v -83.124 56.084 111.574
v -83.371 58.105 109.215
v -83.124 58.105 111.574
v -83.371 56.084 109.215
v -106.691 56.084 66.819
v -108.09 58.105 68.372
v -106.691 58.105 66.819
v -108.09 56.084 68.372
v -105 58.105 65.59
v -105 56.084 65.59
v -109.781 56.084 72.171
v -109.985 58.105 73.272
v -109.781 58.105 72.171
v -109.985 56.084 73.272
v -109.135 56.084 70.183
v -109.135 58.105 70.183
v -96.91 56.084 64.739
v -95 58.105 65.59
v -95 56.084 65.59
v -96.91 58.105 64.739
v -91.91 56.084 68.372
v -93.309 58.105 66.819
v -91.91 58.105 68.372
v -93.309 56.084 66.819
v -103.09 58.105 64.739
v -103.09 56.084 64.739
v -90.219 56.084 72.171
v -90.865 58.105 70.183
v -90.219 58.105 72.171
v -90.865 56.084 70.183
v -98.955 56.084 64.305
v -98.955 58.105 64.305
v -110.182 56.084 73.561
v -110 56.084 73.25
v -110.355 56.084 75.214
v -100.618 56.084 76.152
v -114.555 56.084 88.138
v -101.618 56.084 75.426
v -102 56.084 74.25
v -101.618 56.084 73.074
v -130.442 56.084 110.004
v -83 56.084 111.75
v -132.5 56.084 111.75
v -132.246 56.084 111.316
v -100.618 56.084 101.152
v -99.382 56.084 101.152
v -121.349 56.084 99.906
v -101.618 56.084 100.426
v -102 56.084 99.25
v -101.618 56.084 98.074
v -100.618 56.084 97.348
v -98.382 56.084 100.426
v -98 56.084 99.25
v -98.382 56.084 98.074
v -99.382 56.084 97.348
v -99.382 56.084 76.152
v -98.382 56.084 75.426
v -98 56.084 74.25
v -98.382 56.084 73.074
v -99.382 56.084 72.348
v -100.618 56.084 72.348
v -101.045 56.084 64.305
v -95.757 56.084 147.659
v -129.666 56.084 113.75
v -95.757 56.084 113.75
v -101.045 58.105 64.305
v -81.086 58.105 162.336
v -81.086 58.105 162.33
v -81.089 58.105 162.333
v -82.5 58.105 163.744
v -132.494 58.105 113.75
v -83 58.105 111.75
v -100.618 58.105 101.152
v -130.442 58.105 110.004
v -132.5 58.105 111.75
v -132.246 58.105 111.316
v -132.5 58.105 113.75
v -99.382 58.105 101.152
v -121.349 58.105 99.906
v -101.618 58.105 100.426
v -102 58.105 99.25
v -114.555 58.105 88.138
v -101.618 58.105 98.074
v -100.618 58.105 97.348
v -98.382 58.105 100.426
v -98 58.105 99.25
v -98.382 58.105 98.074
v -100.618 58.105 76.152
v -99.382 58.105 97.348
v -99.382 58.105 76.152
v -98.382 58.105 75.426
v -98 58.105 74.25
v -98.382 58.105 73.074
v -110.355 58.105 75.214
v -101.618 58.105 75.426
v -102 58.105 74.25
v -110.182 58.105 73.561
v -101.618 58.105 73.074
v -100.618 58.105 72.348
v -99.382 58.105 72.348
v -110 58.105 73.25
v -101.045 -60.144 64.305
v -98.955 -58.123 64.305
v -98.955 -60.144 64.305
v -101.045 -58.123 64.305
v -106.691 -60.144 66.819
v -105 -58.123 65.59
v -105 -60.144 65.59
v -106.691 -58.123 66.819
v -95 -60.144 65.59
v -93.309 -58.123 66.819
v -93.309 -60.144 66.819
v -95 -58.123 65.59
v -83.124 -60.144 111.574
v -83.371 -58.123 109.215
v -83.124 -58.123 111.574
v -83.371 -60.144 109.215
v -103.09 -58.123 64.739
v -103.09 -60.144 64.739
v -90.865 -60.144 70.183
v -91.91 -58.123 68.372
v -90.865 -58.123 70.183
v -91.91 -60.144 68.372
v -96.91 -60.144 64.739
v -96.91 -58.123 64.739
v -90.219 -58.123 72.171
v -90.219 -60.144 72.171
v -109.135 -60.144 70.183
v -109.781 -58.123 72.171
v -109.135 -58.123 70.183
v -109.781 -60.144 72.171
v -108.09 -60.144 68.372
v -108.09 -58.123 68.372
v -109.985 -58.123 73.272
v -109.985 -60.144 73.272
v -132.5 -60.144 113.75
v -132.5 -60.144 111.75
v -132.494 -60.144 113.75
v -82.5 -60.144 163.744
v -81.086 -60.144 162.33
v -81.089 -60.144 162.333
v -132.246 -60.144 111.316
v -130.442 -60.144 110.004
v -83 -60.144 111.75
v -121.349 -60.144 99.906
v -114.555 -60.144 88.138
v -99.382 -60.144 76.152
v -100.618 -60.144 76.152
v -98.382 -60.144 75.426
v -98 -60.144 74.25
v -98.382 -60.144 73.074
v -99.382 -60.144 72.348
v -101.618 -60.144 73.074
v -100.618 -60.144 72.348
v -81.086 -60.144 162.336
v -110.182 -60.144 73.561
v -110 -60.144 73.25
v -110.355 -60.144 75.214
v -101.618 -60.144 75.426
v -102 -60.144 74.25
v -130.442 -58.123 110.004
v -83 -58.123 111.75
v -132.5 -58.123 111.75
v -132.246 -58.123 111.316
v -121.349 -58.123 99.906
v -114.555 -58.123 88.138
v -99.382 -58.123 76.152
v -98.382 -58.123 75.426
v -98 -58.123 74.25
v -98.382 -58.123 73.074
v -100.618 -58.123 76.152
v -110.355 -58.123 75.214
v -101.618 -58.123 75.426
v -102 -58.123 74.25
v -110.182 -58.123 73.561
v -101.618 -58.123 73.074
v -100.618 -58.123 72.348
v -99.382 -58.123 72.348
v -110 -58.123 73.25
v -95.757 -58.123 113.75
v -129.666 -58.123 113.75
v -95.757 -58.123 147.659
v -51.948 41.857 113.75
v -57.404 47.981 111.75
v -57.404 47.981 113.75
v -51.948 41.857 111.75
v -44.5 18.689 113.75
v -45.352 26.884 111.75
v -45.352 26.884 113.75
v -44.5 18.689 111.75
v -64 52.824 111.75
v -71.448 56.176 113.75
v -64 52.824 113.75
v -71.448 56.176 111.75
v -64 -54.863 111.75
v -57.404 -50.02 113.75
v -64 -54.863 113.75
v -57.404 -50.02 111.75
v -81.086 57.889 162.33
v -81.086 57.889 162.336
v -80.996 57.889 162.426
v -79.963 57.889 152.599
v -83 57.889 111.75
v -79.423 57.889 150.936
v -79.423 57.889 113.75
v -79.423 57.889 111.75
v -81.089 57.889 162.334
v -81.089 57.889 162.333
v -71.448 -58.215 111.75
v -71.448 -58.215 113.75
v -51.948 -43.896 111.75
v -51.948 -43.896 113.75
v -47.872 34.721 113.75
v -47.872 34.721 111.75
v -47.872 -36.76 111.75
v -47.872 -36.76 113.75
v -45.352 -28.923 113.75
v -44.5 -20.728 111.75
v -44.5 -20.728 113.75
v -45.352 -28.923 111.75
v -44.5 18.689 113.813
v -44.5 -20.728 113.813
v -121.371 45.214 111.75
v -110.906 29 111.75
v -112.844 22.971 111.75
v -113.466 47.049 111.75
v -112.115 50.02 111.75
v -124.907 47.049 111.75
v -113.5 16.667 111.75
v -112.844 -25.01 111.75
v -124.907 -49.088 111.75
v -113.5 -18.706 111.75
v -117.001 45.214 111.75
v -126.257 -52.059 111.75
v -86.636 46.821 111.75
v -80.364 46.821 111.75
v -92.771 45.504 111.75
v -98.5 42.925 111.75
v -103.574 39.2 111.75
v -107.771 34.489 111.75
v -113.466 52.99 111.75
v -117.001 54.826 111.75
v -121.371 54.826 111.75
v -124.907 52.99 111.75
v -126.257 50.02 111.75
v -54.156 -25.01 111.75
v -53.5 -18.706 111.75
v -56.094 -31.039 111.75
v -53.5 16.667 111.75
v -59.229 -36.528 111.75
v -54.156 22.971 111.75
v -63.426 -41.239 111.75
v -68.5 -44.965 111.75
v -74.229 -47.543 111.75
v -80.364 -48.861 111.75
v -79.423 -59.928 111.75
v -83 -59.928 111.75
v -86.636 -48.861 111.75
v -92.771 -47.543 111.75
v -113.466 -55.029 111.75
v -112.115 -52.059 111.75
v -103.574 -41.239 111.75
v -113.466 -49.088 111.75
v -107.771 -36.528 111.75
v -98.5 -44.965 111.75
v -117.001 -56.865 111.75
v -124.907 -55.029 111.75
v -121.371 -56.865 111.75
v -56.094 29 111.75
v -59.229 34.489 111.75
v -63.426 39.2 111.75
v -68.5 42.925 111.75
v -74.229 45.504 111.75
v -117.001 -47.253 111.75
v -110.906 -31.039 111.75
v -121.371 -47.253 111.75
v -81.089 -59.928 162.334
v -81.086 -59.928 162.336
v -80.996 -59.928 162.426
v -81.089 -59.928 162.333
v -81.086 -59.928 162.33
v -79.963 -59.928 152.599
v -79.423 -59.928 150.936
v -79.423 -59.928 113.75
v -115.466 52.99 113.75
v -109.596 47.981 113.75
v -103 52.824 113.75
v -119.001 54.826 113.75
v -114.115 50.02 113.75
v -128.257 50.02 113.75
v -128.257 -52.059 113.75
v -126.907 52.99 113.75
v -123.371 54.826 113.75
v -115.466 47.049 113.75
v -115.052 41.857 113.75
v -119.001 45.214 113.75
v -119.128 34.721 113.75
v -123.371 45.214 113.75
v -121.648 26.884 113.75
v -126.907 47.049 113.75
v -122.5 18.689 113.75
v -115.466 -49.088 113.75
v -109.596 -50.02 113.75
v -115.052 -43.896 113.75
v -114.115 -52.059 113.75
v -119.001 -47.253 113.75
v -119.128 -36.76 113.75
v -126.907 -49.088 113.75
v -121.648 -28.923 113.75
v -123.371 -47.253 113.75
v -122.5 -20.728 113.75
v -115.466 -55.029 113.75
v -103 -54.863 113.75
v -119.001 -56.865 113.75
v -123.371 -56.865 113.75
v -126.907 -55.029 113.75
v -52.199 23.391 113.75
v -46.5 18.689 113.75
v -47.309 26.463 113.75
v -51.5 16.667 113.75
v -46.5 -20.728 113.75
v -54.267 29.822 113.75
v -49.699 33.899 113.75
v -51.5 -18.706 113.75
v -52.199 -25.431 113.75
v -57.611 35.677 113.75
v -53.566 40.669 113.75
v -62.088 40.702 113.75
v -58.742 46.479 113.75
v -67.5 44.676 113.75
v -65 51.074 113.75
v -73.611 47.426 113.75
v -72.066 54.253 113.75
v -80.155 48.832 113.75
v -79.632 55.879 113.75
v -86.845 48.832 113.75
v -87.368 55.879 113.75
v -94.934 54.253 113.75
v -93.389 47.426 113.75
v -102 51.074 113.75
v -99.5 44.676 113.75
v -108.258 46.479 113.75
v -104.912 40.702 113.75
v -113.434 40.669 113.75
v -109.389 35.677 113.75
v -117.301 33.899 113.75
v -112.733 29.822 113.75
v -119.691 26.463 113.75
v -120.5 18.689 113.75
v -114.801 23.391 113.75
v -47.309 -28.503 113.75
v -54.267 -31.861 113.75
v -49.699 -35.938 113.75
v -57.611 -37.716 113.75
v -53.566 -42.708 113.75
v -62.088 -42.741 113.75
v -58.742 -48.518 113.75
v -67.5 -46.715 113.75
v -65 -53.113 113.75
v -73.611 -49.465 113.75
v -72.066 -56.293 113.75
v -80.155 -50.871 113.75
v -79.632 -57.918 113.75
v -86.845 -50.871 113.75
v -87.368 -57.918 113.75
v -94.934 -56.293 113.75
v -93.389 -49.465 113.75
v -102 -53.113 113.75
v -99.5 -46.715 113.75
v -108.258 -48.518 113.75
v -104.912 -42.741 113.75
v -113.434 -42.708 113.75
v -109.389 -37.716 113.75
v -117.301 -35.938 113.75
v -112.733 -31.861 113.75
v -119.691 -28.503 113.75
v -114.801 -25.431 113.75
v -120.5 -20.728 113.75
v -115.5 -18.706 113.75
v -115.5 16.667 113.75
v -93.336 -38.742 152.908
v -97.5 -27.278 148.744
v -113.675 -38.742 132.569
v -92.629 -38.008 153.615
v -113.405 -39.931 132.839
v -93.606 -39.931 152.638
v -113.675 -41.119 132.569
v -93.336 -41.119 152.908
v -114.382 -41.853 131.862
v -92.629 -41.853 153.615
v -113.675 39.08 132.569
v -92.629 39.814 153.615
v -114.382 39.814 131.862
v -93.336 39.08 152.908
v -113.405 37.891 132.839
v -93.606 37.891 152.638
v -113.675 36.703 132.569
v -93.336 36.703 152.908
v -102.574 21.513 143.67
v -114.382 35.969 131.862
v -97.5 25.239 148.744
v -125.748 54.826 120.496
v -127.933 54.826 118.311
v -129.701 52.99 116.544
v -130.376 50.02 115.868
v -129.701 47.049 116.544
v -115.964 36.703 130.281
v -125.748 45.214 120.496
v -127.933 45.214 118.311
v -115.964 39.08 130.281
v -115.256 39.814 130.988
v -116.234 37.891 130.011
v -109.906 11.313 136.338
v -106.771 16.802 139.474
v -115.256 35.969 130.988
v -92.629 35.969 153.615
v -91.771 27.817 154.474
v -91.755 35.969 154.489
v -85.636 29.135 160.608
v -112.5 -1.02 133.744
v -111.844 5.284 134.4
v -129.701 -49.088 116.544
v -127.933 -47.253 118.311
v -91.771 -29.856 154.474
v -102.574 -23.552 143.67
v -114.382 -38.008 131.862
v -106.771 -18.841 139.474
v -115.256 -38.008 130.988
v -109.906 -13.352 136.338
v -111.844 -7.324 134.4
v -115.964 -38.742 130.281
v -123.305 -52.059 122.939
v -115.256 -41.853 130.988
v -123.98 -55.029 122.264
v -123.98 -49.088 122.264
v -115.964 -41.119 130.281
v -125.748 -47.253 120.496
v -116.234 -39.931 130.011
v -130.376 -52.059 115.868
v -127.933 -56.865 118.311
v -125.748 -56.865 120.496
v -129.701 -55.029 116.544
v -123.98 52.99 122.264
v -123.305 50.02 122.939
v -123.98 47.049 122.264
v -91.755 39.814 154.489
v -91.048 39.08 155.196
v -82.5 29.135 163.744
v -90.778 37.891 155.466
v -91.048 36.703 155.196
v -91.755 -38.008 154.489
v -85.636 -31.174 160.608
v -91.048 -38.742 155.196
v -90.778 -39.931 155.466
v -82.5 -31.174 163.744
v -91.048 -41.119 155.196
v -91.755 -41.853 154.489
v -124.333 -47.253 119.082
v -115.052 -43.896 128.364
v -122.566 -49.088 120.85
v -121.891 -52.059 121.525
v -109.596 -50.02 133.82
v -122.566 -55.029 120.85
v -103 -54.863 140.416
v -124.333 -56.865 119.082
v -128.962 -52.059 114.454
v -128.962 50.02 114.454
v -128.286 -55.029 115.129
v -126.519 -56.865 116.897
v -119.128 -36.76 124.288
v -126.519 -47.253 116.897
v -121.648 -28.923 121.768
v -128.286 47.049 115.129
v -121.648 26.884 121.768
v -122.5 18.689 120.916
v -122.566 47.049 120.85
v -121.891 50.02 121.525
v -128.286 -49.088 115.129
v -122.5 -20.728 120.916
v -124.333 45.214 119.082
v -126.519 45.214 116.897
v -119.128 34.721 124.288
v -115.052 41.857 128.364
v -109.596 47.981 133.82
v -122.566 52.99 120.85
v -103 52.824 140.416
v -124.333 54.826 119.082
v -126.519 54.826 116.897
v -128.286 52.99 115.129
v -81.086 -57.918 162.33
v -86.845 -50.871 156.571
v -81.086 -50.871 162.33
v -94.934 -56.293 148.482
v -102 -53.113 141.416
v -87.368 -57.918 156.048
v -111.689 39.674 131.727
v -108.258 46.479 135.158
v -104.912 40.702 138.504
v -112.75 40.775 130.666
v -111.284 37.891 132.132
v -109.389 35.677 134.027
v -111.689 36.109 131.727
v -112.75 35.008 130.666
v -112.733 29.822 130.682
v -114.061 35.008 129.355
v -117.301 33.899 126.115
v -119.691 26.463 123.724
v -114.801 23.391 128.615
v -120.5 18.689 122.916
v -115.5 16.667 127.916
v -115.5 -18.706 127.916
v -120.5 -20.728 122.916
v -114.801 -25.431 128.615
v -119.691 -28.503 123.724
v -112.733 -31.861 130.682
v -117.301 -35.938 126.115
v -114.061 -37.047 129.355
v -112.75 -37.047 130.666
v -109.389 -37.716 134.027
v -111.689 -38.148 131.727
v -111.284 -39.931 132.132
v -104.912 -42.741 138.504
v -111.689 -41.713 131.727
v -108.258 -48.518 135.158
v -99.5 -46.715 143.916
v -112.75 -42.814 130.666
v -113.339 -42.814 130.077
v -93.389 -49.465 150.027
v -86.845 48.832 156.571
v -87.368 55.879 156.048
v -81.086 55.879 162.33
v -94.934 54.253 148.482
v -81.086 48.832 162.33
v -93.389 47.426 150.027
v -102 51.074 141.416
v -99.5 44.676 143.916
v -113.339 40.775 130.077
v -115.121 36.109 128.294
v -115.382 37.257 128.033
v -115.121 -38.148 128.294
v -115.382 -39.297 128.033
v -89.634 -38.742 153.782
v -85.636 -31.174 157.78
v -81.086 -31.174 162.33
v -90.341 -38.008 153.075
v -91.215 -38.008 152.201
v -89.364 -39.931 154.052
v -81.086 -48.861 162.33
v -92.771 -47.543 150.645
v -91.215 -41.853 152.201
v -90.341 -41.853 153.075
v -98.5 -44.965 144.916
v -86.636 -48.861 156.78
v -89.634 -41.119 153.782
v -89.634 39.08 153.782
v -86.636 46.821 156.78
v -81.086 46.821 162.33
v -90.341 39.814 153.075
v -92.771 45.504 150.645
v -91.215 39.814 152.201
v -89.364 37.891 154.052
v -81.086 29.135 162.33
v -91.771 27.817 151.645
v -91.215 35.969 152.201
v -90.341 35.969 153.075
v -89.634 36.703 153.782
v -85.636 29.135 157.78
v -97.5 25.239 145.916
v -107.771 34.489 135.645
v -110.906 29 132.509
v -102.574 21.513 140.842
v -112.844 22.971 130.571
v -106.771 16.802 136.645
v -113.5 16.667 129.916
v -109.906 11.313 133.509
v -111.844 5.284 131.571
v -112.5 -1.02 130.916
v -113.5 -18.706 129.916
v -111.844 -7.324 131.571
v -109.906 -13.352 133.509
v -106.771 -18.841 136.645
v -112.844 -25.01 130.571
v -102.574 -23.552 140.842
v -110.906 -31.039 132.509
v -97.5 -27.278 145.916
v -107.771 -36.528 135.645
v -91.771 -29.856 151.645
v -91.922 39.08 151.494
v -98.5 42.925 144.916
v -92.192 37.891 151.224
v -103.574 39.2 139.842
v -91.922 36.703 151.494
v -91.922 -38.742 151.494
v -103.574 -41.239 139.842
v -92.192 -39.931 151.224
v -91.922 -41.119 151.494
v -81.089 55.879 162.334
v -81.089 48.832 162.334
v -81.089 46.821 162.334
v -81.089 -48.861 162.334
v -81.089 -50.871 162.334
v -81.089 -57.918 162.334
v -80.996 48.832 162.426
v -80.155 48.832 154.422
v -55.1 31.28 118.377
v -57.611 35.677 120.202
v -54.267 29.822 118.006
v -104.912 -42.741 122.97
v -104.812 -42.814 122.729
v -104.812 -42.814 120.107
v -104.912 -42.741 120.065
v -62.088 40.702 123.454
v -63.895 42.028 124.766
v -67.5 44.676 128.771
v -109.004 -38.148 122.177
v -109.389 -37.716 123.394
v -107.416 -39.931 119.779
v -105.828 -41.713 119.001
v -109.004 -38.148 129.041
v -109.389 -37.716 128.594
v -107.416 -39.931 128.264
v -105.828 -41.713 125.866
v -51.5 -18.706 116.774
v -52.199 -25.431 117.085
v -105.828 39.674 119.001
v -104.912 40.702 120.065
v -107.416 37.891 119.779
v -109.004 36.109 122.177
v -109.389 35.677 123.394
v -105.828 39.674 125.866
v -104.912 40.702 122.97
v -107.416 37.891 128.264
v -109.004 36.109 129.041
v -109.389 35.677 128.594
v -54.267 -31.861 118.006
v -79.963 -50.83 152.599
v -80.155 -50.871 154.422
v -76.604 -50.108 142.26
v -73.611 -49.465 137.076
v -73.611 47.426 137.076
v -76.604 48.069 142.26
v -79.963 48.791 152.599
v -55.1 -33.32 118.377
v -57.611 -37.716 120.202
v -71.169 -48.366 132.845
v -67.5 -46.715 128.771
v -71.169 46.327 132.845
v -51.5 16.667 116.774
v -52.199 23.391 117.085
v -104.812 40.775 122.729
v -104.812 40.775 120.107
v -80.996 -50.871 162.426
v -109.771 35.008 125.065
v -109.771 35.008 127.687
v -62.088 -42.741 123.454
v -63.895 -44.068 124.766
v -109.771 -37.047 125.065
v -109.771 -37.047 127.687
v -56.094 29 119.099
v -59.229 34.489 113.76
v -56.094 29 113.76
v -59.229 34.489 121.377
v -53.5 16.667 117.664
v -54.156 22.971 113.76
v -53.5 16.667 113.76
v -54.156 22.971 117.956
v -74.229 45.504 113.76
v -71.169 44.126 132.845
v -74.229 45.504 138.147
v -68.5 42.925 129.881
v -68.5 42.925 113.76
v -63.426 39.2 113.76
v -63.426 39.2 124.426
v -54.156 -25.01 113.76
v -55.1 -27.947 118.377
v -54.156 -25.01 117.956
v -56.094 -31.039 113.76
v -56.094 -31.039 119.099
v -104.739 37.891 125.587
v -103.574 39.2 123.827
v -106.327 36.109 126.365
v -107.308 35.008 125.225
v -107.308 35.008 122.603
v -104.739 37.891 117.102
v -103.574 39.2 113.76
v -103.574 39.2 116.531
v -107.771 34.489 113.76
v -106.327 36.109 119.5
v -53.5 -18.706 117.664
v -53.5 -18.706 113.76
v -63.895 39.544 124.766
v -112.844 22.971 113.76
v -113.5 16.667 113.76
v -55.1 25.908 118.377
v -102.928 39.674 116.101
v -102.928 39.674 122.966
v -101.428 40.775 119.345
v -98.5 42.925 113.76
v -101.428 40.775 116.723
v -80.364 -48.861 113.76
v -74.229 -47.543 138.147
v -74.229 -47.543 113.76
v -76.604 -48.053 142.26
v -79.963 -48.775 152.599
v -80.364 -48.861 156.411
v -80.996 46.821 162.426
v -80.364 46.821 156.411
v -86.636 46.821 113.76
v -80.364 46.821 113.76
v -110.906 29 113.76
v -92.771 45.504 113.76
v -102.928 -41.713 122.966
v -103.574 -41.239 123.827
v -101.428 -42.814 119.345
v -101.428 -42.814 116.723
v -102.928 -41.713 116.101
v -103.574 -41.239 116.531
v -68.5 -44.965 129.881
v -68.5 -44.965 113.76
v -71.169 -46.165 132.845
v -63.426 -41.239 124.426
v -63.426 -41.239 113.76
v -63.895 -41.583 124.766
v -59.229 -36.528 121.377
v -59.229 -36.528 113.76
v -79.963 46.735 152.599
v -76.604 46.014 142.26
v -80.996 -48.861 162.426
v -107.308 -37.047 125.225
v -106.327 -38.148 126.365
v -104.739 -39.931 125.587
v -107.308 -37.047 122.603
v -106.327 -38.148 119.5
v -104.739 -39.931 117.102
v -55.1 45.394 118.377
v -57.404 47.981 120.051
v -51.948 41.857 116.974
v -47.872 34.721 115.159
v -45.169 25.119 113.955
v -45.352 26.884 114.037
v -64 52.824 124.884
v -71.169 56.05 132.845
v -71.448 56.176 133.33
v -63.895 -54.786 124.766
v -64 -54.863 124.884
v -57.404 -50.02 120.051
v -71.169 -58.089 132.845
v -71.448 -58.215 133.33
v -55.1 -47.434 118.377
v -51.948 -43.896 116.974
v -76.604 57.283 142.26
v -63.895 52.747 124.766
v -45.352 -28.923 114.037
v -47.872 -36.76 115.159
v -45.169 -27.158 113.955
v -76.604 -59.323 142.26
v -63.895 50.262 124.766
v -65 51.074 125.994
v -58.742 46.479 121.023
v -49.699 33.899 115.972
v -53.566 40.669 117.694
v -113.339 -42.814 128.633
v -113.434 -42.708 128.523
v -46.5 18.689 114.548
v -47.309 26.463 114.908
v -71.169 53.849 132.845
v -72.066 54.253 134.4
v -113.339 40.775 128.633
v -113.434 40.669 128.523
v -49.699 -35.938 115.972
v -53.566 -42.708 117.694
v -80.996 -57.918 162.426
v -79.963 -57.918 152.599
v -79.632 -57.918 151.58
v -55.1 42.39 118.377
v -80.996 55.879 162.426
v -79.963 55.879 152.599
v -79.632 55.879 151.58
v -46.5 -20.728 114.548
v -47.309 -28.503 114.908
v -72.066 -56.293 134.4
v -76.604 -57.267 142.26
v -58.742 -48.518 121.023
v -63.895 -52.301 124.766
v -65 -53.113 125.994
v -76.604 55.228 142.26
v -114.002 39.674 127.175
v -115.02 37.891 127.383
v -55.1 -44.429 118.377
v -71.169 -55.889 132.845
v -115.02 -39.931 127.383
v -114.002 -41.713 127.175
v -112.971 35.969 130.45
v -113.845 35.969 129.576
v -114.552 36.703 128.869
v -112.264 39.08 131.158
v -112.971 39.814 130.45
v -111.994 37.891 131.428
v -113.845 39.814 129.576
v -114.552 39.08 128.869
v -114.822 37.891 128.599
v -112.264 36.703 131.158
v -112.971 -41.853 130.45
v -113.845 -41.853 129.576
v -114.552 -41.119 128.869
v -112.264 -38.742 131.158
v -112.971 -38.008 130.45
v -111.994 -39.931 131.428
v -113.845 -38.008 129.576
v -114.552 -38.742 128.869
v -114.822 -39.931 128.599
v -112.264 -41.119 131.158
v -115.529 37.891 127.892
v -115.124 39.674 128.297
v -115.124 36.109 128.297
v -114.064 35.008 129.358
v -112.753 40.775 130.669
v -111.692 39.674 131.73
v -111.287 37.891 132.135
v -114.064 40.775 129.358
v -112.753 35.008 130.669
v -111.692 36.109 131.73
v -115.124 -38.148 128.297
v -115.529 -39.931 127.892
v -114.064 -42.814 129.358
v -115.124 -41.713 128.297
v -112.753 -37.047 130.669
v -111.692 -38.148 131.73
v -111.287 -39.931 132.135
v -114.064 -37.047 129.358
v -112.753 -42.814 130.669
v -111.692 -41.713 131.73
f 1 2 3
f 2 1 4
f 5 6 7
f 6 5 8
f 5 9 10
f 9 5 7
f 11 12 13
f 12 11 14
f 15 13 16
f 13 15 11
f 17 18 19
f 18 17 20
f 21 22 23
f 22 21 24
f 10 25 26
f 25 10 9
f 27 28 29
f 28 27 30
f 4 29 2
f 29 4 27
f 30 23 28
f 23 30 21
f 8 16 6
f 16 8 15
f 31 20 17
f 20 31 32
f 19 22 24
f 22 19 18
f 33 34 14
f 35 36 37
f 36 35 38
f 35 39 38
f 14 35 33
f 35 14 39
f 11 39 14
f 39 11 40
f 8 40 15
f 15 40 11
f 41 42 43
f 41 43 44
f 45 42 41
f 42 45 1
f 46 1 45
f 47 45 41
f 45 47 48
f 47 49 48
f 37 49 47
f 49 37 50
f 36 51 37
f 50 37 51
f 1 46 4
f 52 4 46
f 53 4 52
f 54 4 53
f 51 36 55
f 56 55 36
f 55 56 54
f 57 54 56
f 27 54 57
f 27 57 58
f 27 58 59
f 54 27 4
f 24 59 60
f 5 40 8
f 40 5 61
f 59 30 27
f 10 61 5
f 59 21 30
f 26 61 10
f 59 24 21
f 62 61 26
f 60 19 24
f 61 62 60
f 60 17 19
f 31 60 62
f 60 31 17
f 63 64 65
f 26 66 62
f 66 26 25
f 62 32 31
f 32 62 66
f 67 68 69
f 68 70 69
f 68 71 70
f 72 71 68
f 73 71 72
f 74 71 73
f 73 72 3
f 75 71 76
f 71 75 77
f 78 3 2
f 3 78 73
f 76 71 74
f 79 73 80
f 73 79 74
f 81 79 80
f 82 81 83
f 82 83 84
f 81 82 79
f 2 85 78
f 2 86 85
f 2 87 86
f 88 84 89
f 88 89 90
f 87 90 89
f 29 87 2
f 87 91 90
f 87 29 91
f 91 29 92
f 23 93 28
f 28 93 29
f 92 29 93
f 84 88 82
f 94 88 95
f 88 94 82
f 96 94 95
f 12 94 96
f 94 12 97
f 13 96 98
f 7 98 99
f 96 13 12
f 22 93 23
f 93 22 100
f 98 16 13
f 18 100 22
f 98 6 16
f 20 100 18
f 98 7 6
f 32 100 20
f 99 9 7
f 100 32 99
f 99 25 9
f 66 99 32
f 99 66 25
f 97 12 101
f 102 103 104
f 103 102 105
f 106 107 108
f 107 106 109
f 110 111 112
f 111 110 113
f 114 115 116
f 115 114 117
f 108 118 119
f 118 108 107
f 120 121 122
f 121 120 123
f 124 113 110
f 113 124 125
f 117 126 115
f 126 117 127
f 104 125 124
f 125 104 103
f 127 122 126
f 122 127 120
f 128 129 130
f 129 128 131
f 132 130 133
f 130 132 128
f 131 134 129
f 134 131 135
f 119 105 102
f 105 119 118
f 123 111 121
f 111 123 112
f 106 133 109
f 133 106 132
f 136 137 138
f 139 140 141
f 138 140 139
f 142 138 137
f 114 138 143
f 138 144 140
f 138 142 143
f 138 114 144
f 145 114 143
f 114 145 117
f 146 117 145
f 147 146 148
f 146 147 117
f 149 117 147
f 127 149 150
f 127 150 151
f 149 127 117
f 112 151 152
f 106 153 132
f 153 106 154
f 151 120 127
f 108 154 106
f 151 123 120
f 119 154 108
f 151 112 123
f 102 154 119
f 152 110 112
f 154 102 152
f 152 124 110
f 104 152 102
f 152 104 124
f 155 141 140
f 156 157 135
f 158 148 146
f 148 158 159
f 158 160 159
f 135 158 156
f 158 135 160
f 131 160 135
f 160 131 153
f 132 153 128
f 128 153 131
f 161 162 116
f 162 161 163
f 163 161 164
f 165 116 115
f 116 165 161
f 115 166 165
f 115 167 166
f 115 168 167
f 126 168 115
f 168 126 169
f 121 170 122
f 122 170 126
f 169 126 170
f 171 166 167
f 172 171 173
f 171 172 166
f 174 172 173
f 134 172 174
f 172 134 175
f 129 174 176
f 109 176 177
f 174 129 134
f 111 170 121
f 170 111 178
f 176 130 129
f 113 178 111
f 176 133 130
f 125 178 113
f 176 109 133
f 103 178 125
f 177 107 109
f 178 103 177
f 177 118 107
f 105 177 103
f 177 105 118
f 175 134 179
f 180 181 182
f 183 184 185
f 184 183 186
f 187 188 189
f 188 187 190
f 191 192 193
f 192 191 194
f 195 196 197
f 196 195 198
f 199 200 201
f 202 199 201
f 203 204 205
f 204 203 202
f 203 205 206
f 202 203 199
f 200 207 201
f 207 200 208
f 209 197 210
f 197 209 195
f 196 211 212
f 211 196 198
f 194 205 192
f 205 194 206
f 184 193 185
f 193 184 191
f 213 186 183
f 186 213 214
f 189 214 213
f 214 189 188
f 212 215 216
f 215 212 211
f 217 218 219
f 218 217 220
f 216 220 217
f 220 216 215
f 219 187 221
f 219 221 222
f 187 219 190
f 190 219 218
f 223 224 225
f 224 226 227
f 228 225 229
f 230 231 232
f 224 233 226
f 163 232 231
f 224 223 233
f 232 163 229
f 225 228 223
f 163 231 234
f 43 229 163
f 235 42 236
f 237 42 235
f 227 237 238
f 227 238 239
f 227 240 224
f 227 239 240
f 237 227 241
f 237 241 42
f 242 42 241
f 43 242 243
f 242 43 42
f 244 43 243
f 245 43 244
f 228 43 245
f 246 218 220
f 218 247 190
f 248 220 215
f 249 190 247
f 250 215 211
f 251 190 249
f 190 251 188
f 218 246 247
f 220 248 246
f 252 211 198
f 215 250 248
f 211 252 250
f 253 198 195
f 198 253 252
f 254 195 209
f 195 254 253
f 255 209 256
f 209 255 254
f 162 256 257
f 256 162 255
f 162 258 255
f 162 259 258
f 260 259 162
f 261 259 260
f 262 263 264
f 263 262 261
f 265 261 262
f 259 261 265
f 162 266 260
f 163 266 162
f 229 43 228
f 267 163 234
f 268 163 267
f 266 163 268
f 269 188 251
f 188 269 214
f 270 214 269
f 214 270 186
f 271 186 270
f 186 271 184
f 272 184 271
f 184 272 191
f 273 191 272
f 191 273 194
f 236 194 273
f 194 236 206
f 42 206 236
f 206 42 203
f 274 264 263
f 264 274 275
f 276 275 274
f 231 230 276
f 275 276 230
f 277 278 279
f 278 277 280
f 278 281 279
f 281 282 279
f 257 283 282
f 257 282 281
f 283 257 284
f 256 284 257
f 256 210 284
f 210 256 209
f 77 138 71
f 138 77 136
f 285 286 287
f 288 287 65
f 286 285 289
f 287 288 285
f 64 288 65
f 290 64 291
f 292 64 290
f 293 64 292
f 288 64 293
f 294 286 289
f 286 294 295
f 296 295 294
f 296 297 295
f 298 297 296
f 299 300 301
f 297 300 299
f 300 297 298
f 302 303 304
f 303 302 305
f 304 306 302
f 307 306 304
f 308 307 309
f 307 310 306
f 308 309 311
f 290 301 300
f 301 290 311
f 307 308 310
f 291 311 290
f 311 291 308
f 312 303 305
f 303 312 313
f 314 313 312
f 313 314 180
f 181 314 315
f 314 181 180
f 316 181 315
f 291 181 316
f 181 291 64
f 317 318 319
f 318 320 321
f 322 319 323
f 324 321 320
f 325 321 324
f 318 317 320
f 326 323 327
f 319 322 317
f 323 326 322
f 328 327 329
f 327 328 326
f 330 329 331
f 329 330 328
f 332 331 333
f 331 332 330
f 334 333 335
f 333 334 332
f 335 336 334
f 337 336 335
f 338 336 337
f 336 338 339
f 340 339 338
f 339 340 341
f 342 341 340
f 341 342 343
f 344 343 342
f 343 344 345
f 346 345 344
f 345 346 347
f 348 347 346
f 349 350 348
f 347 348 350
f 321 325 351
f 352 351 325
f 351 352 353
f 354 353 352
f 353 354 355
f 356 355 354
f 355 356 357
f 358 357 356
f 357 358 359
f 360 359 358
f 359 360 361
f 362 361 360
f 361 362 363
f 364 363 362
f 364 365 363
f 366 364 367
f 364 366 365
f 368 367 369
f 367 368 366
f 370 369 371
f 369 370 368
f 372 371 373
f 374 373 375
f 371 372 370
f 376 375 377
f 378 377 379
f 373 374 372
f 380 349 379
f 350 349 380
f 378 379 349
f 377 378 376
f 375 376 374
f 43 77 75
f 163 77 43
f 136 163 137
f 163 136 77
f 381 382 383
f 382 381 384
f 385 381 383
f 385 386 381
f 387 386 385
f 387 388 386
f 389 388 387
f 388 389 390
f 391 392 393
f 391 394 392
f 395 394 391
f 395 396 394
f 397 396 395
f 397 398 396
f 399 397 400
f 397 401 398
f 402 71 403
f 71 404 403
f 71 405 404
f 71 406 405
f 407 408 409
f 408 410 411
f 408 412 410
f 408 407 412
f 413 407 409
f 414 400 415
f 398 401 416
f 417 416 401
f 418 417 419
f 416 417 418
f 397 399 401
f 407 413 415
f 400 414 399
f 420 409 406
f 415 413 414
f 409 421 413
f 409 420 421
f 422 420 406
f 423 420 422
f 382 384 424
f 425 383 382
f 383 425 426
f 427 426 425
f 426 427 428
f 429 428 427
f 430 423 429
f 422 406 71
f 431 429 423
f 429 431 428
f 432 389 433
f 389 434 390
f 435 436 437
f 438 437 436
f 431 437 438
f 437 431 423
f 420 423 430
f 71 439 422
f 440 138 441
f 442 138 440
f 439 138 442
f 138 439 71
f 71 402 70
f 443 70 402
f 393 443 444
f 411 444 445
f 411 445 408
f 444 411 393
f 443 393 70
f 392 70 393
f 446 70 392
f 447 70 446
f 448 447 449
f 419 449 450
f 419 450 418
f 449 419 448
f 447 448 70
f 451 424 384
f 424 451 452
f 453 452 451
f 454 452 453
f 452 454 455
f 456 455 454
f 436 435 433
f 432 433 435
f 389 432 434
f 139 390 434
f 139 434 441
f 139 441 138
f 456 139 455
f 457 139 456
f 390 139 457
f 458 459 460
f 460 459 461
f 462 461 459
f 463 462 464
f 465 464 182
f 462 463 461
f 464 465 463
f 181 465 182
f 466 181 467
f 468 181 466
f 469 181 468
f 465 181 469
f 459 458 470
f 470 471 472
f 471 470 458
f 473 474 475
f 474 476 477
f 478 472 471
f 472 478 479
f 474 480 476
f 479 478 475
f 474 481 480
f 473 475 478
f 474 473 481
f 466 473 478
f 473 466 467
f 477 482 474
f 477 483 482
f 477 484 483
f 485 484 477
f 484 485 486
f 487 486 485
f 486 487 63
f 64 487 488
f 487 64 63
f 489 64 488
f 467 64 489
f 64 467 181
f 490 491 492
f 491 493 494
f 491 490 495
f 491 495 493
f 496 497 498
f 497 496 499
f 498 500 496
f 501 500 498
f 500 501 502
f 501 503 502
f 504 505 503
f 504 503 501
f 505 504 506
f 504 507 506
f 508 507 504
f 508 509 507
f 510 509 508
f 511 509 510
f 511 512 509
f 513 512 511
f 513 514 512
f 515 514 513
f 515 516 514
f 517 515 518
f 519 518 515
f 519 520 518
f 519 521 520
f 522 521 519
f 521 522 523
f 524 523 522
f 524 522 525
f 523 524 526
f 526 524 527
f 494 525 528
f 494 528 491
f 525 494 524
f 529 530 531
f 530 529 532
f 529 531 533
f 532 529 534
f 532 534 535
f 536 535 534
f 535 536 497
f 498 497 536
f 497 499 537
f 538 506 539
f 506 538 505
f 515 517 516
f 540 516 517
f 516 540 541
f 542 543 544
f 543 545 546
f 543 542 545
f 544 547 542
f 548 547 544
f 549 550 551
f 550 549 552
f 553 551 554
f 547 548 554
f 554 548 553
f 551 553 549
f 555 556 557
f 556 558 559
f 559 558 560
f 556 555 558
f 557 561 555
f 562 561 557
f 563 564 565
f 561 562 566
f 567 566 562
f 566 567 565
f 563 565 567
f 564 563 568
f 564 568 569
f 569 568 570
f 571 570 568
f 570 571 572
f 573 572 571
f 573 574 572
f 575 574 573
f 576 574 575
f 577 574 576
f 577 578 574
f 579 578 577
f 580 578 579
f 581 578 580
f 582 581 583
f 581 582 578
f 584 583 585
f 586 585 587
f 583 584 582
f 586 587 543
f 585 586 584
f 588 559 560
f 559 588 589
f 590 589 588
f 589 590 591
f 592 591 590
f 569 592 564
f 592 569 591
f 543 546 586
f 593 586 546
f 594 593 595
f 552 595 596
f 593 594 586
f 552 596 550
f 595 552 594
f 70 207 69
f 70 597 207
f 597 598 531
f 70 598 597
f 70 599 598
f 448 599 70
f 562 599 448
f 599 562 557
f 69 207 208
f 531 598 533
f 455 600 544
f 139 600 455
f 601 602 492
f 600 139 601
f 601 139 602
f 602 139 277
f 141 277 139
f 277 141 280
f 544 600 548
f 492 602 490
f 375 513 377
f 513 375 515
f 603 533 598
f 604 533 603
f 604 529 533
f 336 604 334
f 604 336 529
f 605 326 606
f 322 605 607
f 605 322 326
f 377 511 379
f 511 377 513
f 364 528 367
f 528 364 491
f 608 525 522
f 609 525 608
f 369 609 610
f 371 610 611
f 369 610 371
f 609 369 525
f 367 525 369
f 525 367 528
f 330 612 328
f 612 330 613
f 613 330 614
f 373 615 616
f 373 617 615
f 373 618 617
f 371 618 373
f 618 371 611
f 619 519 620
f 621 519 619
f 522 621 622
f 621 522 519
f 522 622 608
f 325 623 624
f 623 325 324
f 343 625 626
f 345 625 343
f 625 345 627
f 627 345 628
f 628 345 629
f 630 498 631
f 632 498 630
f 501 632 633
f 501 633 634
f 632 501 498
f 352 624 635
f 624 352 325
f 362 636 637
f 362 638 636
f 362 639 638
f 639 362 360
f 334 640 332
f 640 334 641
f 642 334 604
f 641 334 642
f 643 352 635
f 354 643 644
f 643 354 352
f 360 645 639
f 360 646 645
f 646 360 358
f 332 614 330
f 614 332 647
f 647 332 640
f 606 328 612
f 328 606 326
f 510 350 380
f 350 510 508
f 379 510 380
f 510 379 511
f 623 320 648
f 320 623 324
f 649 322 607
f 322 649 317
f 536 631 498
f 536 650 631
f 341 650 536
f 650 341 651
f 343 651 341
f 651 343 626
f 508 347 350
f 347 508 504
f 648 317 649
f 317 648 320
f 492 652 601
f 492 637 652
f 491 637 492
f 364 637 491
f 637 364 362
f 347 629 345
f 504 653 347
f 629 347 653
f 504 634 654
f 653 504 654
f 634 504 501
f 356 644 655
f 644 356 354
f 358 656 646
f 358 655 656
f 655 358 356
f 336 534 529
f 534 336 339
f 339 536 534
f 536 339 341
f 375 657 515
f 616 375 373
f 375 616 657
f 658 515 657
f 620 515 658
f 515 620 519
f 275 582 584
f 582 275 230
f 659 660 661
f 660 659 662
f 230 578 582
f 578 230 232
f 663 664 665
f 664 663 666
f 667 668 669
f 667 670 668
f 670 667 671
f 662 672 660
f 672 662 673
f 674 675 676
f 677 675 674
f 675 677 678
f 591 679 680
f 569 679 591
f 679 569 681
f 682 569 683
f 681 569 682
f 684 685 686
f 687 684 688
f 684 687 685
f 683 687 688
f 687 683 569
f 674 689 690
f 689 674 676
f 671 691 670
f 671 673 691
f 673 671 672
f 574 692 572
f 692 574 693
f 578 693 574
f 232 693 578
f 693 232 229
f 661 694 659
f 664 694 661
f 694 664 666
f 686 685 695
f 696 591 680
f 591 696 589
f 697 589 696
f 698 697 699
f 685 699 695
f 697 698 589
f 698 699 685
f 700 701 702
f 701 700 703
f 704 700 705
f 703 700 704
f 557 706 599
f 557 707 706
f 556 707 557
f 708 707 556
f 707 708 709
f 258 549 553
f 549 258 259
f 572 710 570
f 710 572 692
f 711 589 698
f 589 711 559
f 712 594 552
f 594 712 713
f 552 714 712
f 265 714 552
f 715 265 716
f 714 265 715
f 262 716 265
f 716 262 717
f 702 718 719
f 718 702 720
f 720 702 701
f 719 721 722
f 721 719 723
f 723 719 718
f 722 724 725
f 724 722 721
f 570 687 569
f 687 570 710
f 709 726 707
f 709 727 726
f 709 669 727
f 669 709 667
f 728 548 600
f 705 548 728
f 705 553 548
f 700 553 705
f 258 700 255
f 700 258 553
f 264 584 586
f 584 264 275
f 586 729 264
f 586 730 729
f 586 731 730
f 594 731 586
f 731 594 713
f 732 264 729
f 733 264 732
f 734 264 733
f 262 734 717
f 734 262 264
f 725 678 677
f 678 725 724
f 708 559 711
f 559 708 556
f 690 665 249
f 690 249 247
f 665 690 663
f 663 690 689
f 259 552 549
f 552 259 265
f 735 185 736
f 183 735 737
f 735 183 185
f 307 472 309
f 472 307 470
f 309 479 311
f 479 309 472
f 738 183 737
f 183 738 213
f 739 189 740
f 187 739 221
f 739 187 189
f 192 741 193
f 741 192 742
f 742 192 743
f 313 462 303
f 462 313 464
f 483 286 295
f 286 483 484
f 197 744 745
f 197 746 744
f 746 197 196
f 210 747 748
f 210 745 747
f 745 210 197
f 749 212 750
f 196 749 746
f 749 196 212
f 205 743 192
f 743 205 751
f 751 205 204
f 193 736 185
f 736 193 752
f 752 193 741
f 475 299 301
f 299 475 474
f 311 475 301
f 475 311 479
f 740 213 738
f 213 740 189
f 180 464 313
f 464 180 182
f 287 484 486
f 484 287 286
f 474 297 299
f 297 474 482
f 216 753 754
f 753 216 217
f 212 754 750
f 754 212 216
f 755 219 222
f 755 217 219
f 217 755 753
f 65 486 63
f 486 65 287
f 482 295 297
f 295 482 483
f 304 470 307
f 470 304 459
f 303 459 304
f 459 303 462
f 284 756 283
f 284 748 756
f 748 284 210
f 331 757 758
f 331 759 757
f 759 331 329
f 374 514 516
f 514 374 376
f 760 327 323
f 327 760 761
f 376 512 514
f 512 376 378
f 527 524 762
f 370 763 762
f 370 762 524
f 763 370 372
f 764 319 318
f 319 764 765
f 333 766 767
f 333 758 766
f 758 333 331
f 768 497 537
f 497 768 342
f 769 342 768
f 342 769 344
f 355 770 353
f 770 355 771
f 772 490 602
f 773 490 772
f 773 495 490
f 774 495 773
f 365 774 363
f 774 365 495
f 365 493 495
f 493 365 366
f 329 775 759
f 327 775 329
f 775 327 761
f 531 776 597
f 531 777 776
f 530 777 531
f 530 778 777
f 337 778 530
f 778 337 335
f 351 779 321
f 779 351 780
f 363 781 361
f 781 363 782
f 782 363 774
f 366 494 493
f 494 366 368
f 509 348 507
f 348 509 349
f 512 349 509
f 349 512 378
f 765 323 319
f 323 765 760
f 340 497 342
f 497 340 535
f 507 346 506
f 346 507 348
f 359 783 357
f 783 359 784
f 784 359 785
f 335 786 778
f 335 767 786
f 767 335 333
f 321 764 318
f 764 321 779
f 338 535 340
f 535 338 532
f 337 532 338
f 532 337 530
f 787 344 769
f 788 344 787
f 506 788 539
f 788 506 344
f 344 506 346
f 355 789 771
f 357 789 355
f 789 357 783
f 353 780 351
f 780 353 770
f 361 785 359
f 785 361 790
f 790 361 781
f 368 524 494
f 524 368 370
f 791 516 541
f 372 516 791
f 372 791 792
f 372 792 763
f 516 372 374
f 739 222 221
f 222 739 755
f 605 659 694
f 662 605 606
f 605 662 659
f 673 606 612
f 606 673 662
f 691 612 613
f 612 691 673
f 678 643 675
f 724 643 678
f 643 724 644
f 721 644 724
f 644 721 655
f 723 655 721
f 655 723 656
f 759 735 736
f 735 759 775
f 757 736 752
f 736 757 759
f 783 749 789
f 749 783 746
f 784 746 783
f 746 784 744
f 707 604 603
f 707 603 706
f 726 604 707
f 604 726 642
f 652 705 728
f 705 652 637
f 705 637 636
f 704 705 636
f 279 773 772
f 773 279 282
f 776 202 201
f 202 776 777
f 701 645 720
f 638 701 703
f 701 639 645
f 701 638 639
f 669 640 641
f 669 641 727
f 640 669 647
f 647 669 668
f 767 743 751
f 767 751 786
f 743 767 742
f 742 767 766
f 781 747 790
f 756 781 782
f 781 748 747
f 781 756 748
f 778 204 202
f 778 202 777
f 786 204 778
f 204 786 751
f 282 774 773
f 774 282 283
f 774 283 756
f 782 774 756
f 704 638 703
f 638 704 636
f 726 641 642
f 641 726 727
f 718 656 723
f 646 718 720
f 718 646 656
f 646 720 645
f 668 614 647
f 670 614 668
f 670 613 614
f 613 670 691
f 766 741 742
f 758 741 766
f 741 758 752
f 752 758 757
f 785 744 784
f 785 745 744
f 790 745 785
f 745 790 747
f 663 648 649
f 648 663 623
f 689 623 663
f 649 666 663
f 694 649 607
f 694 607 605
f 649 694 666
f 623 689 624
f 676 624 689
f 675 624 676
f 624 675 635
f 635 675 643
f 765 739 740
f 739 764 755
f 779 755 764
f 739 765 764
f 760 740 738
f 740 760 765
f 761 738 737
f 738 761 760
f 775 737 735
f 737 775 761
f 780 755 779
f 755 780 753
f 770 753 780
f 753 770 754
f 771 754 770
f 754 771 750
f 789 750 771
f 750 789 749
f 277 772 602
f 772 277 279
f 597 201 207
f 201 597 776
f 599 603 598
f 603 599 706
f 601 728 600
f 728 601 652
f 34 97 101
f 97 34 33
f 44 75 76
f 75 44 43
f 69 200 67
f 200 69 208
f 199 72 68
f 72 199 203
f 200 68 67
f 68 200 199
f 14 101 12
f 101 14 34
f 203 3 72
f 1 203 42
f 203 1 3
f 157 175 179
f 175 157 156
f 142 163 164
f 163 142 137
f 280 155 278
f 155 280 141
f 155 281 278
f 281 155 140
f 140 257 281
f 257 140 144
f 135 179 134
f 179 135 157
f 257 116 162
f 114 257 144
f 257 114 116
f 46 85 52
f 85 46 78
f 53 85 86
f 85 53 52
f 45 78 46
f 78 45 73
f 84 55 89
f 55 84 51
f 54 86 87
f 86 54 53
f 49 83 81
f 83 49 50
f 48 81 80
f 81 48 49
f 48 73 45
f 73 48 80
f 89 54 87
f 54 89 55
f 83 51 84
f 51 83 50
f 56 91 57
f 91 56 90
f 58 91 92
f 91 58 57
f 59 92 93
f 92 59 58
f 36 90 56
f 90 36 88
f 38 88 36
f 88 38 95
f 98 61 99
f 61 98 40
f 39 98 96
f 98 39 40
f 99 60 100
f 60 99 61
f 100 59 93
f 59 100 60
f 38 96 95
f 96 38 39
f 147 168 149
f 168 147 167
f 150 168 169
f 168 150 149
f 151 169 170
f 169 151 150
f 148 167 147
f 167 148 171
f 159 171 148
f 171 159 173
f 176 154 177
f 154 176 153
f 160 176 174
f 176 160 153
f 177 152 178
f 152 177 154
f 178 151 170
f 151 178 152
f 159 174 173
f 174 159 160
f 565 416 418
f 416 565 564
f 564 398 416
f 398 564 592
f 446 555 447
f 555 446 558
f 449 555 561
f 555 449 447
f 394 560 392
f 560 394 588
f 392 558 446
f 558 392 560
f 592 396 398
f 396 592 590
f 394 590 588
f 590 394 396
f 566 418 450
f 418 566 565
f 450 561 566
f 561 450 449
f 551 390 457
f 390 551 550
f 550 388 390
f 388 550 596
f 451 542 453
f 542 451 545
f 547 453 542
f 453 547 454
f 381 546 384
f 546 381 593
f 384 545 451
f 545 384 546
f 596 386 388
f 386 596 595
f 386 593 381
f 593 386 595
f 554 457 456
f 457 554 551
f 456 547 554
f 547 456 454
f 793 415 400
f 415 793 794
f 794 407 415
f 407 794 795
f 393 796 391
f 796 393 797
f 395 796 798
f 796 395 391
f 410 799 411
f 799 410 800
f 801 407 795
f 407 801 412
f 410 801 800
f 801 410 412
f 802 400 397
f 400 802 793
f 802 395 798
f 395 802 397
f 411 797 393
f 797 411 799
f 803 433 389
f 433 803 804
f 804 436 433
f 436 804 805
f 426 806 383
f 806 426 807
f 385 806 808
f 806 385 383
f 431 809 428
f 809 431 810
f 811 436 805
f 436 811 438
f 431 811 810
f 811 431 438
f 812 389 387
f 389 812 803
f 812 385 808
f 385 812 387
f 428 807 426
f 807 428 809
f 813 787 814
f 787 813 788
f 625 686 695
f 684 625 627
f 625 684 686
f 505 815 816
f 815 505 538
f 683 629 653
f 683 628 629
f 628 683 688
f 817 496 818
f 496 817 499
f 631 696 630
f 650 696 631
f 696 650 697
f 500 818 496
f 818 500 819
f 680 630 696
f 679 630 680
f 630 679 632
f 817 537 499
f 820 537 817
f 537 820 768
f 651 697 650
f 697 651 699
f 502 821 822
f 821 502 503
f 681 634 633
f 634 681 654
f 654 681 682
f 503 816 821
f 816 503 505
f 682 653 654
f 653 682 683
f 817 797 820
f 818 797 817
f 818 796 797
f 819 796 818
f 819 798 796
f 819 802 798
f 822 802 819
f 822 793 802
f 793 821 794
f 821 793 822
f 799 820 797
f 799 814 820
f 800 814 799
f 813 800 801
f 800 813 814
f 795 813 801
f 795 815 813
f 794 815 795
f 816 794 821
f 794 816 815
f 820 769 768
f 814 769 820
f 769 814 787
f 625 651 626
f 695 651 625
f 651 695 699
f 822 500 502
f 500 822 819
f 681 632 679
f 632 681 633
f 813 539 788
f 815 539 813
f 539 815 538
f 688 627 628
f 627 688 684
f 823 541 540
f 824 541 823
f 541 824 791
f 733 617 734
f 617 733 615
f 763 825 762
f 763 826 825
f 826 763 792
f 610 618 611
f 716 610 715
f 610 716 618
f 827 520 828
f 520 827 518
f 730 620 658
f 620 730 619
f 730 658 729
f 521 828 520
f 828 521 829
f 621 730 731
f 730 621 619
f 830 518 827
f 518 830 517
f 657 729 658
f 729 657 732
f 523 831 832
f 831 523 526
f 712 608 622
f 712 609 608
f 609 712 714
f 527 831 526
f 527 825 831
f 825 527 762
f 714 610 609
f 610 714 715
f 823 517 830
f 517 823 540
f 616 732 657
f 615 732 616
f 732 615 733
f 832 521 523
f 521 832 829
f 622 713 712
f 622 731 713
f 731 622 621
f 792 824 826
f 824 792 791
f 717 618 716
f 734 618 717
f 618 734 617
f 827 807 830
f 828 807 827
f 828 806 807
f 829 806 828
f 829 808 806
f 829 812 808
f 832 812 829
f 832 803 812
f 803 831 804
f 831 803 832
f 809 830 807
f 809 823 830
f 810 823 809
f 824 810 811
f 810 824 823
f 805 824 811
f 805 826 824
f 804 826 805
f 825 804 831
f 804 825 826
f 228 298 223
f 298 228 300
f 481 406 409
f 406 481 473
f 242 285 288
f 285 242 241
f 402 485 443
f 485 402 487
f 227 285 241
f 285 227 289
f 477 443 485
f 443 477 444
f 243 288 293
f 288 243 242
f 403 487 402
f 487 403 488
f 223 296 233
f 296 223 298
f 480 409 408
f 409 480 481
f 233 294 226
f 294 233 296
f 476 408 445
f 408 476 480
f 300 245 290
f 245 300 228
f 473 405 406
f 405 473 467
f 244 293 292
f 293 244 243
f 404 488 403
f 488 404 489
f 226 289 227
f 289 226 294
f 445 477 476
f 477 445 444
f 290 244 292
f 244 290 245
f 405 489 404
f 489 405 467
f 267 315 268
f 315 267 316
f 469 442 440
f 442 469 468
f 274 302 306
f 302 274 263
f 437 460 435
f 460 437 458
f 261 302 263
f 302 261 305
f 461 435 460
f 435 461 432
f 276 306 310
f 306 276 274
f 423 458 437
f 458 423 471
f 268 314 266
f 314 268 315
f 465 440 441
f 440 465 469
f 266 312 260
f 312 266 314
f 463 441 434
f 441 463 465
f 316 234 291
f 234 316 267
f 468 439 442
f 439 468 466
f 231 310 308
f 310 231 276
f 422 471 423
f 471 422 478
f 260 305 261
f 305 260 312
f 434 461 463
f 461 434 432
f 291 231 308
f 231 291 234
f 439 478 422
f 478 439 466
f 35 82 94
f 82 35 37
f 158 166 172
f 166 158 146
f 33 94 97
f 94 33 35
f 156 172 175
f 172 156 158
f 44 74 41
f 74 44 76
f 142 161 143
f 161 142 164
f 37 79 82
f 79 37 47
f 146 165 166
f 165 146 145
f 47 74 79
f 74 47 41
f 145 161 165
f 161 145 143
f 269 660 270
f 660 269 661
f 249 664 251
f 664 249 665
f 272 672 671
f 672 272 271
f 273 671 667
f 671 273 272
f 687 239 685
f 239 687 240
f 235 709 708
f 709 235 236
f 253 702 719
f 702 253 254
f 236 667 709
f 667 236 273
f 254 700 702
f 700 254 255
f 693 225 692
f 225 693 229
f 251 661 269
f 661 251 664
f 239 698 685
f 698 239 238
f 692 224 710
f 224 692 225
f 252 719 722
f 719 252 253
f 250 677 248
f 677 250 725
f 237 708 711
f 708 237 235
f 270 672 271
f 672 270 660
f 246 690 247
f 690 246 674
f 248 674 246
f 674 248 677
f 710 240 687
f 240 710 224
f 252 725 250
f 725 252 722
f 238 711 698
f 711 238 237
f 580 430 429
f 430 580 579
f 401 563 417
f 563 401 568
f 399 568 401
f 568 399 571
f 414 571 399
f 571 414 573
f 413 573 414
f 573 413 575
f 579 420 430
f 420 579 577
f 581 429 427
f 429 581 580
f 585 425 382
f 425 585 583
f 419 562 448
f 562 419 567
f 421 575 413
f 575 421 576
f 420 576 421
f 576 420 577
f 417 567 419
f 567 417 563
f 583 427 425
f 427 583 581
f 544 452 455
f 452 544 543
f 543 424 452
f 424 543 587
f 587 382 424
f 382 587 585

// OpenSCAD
//  Windows users must "escape" the backslashes by writing them doubled, or replace the backslashes with forward slashes.

// optimum slicing of round edges:
// for a 0.2mm layer height $fn= 16 * d
// 16 = roundup ( 1mm * pi / 0.2mm )

f1=30; // use 30 for modelling and 360 for rendering
f2=10; // use 10 for modelling and 120 for rendering

dc=104; // back rounding negative
d2=130; // front rounding negative

s=113.6/112.4; // s is fitting factor: 
     // use caliper to exact measure PSU width. 
     // replace numerator with measured value.

translate([-25,95.5,91.75])
scale([1,s,1])
difference()
{
    union()
    {
        translate([0,-113/2-20-19,-5])
        {
            translate([-75,113/2+1,-12.5])
            rotate([90,0,0])
            linear_extrude(height = 2, center = true, convexity = 10, twist = 0)
            hull()
            {
                translate([0,37.5+1,0])
                circle(17, $fn=f1);
                circle(10, $fn=f1);
            };
            translate([-75,-113/2-1,-12.5])
            rotate([90,0,0])
            linear_extrude(height = 2, center = true, convexity = 10, twist = 0)
            hull()
            {
                translate([0,37.5+1,0])
                circle(17, $fn=f1);
                circle(10, $fn=f1);
            };
            
            translate([-75-3.5+20,113/2-81.5-3.5+9,26])
            linear_extrude(height = 2, center = true, convexity = 10, twist = 0)
            hull()
            {
                translate([0,39,0])
                circle(d=78, $fn=f1);
                circle(d=78, $fn=f1);
            };
            
            translate([-75-3.5-4.25-49.5/2,113/2-56.5-117/2,25])
            cube([49.5,117,2],center=false); 
        
            translate([-75-3.5-4.25-49.5/2+2/sqrt(2),113/2-56.5-117/2,25+0.58])
            rotate([0,-45,0])
            cube([50*sqrt(2),117,2],center=false);   
         
            *translate([-215/2,-185,51/2-5.5+2])
            rotate([0,-45,0]) 
            {
                translate([60.54,223.50,2.53])
                cylinder(h=2, d=40, center=true, $fn=f1);
                translate([60.54,223.50-77,2.53])
                cylinder(h=2, d=40, center=true, $fn=f1); 
            };  
            
        };  
        translate([-215/2,-37,22]) // left support
        rotate([90,0,0])
        linear_extrude(height = 2, convexity = 10)
        polygon(points=[
            [0,-2],
            [22.5,-40.5],
            [49.5,-2],
            [50+sqrt(2),50-sqrt(2)]
            ]);  

        translate([-215/2,-37-115,22]) // right support
        rotate([90,0,0])
        linear_extrude(height = 2, convexity = 10)
        polygon(points=[
            [0,-2],
            [22.5,-40.5],
            [49.5,-2],
            [50+sqrt(2),50-sqrt(2)]
            ]);  
      
        // fan hole support
        translate([-58.5,-113,21])
        difference()
        {
            union()
            {
                difference()
                {
                    linear_extrude(height = 52, center = false, convexity = 10, twist = 0)
                    hull()
                    {
                        translate([0,35,0])
                        circle(d=64, $fn=f1);
                        circle(d=64, $fn=f1);
                    };
                    linear_extrude(height = 52, center = false, convexity = 10, twist = 0)
                    hull()
                    {
                        translate([0,35,0])
                        circle(d=60, $fn=f1);
                        circle(d=60, $fn=f1);
                    };            
                };
                translate([0,-2,0])
                difference()
                {
                    linear_extrude(height = 52, center = false, convexity = 10, twist = 0)
                    hull()
                    {
                        translate([0,39,0])
                        circle(d=78, $fn=f1);
                        circle(d=78, $fn=f1);
                    };
                    linear_extrude(height = 52, center = false, convexity = 10, twist = 0)
                    hull()
                    {
                        translate([0,39,0])
                        circle(d=74, $fn=f1);
                        circle(d=74, $fn=f1);
                    };
                };
            };
            
            // back rounding negative
            translate([dc/2+1+sqrt(2)-0.014,76,dc/2-1.34])
            rotate([90,0,0])
            cylinder(h=120,d=dc,$fn=f1);
            
            translate([-108,-43,52.31])
            rotate([0,45,0])
            cube([80,120,80]);
            
        };  
    };
    
    // front rounding negative
    translate([-107.5-41.435,-35.5,20-50.05])
    rotate([90,0,0])
    cylinder(h=120, d=d2, center=false, $fn=f1);
    
    // fan hole
    translate([-58.5,-113,21])
    linear_extrude(height = 2.02, center = true, convexity = 10, twist = 0)
    hull()
    {
        translate([0,35,0])
        circle(d=60, $fn=f1);
        circle(d=60, $fn=f1);
    };
    
    translate([-57.5,-95.5,36])
    rotate([0,0,0])
    cylinder(h=40,d=60,$fn=f1);

    color("grey") //PSU
    difference()
    {
        translate([0,-113/2-20-19,-5])
        union()
        {
            minkowski()
            {
                cube([215-2,113-2,50-2],center=true);
                sphere(d=2,center=true,$fn=f2);
            };

            translate([-75,113/2,12.5])
            rotate([90,0,0])
            cylinder(h=20, d=4, center=true, $fn=f2);

            translate([-75,113/2,-12.5])
            rotate([90,0,0])
            cylinder(h=20, d=4, center=true, $fn=f2);
            
            translate([-75,113/2-31.5,-25])
            rotate([0,0,0])
            cylinder(h=20, d=4, center=true, $fn=f2);
            
            translate([-75,113/2-81.5,-25])
            rotate([0,0,0])
            cylinder(h=20, d=4, center=true, $fn=f2);
            
            translate([-75,113/2-113,-12.5])
            rotate([90,0,0])
            cylinder(h=20, d=4, center=true, $fn=f2);

        };
        
        translate([98+0.001,-113/2-19-20.25,7.001])
        cube([19,113-2*2,26],center=true);
        
    };


    color("blue") //display mock up
    translate([-215/2,-185,51/2-5.5+2])
    rotate([0,-45,0])
    union()
    {
        cube([82,179,3]);

        translate([6,5,0])
        cylinder(h=20, d=4, center=true, $fn=f2);
        translate([76,5,0])
        cylinder(h=20, d=4, center=true, $fn=f2);
        translate([6,174,0])
        cylinder(h=20, d=4, center=true, $fn=f2);
        translate([76,174,0])
        cylinder(h=20, d=4, center=true, $fn=f2);

        translate([57,128,0])
        cylinder(h=20, d=4, center=true, $fn=f2);
        translate([57,51,0])
        cylinder(h=20, d=4, center=true, $fn=f2);
        translate([25,128,0])
        cylinder(h=10, d=4, center=true, $fn=f2);
        translate([25,51,0])
        cylinder(h=10, d=4, center=true, $fn=f2);
        translate([25,128,-12])
        cylinder(h=20, d=6, center=true, $fn=f2);
        translate([25,51,-12])
        cylinder(h=20, d=6, center=true, $fn=f2);
        
        translate([8,140,-10])
        cylinder(h=20, d=10, center=true, $fn=f2);
        translate([8,39,-10])
        cylinder(h=20, d=10, center=true, $fn=f2);
    };  

};









//
